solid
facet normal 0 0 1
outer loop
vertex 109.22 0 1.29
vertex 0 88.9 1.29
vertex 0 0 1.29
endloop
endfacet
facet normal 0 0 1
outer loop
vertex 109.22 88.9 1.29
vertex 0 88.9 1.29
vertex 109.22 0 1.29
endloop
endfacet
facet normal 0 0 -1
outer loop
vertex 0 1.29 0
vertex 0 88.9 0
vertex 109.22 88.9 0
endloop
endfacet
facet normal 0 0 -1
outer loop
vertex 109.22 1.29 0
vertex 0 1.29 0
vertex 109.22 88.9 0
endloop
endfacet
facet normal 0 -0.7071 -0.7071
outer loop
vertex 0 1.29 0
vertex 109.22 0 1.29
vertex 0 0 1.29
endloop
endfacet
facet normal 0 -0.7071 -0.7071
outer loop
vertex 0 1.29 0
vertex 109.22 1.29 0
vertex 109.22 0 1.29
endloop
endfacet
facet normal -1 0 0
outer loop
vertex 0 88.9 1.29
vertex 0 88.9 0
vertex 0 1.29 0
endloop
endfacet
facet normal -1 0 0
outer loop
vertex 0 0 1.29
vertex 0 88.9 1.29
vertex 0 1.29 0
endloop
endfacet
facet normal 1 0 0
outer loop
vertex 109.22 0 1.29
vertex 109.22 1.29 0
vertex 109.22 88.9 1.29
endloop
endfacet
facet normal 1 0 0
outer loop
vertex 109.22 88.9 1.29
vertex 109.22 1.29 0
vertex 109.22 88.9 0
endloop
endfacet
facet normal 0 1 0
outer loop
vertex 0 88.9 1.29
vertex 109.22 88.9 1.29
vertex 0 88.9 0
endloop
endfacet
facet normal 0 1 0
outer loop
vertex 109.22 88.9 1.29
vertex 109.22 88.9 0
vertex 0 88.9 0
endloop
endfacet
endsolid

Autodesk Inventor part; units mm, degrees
ref_plane "YZ Plane" through (0, 0, 0) normal (1, 0, 0) x (0, 1, 0)
ref_plane "XZ Plane" through (0, 0, 0) normal (0, 1, 0) x (-1, 0, 0)
ref_plane "XY Plane" through (0, 0, 0) normal (0, 0, 1) x (1, 0, 0)
sketch "Sketch1" plane through (0, 0, 0) normal (0, 0, 1) x (1, 0, 0)
  line L0 (0, 0) -> (109.22, 0)
  line L1 (109.22, 0) -> (109.22, 88.9)
  line L2 (109.22, 88.9) -> (0, 88.9)
  line L3 (0, 88.9) -> (0, 0)
  dimension "d0" = 109.22
  dimension "d1" = 88.9
extrude "Extrusion1" add sketch "Sketch1" along normal blind 1.2903
chamfer "Chamfer1" distance 1.2903 angle 45 1 edges at (54.61, 0, 0)
properties part number "Plate_Top_Alu25" material "Aluminum 6061"
